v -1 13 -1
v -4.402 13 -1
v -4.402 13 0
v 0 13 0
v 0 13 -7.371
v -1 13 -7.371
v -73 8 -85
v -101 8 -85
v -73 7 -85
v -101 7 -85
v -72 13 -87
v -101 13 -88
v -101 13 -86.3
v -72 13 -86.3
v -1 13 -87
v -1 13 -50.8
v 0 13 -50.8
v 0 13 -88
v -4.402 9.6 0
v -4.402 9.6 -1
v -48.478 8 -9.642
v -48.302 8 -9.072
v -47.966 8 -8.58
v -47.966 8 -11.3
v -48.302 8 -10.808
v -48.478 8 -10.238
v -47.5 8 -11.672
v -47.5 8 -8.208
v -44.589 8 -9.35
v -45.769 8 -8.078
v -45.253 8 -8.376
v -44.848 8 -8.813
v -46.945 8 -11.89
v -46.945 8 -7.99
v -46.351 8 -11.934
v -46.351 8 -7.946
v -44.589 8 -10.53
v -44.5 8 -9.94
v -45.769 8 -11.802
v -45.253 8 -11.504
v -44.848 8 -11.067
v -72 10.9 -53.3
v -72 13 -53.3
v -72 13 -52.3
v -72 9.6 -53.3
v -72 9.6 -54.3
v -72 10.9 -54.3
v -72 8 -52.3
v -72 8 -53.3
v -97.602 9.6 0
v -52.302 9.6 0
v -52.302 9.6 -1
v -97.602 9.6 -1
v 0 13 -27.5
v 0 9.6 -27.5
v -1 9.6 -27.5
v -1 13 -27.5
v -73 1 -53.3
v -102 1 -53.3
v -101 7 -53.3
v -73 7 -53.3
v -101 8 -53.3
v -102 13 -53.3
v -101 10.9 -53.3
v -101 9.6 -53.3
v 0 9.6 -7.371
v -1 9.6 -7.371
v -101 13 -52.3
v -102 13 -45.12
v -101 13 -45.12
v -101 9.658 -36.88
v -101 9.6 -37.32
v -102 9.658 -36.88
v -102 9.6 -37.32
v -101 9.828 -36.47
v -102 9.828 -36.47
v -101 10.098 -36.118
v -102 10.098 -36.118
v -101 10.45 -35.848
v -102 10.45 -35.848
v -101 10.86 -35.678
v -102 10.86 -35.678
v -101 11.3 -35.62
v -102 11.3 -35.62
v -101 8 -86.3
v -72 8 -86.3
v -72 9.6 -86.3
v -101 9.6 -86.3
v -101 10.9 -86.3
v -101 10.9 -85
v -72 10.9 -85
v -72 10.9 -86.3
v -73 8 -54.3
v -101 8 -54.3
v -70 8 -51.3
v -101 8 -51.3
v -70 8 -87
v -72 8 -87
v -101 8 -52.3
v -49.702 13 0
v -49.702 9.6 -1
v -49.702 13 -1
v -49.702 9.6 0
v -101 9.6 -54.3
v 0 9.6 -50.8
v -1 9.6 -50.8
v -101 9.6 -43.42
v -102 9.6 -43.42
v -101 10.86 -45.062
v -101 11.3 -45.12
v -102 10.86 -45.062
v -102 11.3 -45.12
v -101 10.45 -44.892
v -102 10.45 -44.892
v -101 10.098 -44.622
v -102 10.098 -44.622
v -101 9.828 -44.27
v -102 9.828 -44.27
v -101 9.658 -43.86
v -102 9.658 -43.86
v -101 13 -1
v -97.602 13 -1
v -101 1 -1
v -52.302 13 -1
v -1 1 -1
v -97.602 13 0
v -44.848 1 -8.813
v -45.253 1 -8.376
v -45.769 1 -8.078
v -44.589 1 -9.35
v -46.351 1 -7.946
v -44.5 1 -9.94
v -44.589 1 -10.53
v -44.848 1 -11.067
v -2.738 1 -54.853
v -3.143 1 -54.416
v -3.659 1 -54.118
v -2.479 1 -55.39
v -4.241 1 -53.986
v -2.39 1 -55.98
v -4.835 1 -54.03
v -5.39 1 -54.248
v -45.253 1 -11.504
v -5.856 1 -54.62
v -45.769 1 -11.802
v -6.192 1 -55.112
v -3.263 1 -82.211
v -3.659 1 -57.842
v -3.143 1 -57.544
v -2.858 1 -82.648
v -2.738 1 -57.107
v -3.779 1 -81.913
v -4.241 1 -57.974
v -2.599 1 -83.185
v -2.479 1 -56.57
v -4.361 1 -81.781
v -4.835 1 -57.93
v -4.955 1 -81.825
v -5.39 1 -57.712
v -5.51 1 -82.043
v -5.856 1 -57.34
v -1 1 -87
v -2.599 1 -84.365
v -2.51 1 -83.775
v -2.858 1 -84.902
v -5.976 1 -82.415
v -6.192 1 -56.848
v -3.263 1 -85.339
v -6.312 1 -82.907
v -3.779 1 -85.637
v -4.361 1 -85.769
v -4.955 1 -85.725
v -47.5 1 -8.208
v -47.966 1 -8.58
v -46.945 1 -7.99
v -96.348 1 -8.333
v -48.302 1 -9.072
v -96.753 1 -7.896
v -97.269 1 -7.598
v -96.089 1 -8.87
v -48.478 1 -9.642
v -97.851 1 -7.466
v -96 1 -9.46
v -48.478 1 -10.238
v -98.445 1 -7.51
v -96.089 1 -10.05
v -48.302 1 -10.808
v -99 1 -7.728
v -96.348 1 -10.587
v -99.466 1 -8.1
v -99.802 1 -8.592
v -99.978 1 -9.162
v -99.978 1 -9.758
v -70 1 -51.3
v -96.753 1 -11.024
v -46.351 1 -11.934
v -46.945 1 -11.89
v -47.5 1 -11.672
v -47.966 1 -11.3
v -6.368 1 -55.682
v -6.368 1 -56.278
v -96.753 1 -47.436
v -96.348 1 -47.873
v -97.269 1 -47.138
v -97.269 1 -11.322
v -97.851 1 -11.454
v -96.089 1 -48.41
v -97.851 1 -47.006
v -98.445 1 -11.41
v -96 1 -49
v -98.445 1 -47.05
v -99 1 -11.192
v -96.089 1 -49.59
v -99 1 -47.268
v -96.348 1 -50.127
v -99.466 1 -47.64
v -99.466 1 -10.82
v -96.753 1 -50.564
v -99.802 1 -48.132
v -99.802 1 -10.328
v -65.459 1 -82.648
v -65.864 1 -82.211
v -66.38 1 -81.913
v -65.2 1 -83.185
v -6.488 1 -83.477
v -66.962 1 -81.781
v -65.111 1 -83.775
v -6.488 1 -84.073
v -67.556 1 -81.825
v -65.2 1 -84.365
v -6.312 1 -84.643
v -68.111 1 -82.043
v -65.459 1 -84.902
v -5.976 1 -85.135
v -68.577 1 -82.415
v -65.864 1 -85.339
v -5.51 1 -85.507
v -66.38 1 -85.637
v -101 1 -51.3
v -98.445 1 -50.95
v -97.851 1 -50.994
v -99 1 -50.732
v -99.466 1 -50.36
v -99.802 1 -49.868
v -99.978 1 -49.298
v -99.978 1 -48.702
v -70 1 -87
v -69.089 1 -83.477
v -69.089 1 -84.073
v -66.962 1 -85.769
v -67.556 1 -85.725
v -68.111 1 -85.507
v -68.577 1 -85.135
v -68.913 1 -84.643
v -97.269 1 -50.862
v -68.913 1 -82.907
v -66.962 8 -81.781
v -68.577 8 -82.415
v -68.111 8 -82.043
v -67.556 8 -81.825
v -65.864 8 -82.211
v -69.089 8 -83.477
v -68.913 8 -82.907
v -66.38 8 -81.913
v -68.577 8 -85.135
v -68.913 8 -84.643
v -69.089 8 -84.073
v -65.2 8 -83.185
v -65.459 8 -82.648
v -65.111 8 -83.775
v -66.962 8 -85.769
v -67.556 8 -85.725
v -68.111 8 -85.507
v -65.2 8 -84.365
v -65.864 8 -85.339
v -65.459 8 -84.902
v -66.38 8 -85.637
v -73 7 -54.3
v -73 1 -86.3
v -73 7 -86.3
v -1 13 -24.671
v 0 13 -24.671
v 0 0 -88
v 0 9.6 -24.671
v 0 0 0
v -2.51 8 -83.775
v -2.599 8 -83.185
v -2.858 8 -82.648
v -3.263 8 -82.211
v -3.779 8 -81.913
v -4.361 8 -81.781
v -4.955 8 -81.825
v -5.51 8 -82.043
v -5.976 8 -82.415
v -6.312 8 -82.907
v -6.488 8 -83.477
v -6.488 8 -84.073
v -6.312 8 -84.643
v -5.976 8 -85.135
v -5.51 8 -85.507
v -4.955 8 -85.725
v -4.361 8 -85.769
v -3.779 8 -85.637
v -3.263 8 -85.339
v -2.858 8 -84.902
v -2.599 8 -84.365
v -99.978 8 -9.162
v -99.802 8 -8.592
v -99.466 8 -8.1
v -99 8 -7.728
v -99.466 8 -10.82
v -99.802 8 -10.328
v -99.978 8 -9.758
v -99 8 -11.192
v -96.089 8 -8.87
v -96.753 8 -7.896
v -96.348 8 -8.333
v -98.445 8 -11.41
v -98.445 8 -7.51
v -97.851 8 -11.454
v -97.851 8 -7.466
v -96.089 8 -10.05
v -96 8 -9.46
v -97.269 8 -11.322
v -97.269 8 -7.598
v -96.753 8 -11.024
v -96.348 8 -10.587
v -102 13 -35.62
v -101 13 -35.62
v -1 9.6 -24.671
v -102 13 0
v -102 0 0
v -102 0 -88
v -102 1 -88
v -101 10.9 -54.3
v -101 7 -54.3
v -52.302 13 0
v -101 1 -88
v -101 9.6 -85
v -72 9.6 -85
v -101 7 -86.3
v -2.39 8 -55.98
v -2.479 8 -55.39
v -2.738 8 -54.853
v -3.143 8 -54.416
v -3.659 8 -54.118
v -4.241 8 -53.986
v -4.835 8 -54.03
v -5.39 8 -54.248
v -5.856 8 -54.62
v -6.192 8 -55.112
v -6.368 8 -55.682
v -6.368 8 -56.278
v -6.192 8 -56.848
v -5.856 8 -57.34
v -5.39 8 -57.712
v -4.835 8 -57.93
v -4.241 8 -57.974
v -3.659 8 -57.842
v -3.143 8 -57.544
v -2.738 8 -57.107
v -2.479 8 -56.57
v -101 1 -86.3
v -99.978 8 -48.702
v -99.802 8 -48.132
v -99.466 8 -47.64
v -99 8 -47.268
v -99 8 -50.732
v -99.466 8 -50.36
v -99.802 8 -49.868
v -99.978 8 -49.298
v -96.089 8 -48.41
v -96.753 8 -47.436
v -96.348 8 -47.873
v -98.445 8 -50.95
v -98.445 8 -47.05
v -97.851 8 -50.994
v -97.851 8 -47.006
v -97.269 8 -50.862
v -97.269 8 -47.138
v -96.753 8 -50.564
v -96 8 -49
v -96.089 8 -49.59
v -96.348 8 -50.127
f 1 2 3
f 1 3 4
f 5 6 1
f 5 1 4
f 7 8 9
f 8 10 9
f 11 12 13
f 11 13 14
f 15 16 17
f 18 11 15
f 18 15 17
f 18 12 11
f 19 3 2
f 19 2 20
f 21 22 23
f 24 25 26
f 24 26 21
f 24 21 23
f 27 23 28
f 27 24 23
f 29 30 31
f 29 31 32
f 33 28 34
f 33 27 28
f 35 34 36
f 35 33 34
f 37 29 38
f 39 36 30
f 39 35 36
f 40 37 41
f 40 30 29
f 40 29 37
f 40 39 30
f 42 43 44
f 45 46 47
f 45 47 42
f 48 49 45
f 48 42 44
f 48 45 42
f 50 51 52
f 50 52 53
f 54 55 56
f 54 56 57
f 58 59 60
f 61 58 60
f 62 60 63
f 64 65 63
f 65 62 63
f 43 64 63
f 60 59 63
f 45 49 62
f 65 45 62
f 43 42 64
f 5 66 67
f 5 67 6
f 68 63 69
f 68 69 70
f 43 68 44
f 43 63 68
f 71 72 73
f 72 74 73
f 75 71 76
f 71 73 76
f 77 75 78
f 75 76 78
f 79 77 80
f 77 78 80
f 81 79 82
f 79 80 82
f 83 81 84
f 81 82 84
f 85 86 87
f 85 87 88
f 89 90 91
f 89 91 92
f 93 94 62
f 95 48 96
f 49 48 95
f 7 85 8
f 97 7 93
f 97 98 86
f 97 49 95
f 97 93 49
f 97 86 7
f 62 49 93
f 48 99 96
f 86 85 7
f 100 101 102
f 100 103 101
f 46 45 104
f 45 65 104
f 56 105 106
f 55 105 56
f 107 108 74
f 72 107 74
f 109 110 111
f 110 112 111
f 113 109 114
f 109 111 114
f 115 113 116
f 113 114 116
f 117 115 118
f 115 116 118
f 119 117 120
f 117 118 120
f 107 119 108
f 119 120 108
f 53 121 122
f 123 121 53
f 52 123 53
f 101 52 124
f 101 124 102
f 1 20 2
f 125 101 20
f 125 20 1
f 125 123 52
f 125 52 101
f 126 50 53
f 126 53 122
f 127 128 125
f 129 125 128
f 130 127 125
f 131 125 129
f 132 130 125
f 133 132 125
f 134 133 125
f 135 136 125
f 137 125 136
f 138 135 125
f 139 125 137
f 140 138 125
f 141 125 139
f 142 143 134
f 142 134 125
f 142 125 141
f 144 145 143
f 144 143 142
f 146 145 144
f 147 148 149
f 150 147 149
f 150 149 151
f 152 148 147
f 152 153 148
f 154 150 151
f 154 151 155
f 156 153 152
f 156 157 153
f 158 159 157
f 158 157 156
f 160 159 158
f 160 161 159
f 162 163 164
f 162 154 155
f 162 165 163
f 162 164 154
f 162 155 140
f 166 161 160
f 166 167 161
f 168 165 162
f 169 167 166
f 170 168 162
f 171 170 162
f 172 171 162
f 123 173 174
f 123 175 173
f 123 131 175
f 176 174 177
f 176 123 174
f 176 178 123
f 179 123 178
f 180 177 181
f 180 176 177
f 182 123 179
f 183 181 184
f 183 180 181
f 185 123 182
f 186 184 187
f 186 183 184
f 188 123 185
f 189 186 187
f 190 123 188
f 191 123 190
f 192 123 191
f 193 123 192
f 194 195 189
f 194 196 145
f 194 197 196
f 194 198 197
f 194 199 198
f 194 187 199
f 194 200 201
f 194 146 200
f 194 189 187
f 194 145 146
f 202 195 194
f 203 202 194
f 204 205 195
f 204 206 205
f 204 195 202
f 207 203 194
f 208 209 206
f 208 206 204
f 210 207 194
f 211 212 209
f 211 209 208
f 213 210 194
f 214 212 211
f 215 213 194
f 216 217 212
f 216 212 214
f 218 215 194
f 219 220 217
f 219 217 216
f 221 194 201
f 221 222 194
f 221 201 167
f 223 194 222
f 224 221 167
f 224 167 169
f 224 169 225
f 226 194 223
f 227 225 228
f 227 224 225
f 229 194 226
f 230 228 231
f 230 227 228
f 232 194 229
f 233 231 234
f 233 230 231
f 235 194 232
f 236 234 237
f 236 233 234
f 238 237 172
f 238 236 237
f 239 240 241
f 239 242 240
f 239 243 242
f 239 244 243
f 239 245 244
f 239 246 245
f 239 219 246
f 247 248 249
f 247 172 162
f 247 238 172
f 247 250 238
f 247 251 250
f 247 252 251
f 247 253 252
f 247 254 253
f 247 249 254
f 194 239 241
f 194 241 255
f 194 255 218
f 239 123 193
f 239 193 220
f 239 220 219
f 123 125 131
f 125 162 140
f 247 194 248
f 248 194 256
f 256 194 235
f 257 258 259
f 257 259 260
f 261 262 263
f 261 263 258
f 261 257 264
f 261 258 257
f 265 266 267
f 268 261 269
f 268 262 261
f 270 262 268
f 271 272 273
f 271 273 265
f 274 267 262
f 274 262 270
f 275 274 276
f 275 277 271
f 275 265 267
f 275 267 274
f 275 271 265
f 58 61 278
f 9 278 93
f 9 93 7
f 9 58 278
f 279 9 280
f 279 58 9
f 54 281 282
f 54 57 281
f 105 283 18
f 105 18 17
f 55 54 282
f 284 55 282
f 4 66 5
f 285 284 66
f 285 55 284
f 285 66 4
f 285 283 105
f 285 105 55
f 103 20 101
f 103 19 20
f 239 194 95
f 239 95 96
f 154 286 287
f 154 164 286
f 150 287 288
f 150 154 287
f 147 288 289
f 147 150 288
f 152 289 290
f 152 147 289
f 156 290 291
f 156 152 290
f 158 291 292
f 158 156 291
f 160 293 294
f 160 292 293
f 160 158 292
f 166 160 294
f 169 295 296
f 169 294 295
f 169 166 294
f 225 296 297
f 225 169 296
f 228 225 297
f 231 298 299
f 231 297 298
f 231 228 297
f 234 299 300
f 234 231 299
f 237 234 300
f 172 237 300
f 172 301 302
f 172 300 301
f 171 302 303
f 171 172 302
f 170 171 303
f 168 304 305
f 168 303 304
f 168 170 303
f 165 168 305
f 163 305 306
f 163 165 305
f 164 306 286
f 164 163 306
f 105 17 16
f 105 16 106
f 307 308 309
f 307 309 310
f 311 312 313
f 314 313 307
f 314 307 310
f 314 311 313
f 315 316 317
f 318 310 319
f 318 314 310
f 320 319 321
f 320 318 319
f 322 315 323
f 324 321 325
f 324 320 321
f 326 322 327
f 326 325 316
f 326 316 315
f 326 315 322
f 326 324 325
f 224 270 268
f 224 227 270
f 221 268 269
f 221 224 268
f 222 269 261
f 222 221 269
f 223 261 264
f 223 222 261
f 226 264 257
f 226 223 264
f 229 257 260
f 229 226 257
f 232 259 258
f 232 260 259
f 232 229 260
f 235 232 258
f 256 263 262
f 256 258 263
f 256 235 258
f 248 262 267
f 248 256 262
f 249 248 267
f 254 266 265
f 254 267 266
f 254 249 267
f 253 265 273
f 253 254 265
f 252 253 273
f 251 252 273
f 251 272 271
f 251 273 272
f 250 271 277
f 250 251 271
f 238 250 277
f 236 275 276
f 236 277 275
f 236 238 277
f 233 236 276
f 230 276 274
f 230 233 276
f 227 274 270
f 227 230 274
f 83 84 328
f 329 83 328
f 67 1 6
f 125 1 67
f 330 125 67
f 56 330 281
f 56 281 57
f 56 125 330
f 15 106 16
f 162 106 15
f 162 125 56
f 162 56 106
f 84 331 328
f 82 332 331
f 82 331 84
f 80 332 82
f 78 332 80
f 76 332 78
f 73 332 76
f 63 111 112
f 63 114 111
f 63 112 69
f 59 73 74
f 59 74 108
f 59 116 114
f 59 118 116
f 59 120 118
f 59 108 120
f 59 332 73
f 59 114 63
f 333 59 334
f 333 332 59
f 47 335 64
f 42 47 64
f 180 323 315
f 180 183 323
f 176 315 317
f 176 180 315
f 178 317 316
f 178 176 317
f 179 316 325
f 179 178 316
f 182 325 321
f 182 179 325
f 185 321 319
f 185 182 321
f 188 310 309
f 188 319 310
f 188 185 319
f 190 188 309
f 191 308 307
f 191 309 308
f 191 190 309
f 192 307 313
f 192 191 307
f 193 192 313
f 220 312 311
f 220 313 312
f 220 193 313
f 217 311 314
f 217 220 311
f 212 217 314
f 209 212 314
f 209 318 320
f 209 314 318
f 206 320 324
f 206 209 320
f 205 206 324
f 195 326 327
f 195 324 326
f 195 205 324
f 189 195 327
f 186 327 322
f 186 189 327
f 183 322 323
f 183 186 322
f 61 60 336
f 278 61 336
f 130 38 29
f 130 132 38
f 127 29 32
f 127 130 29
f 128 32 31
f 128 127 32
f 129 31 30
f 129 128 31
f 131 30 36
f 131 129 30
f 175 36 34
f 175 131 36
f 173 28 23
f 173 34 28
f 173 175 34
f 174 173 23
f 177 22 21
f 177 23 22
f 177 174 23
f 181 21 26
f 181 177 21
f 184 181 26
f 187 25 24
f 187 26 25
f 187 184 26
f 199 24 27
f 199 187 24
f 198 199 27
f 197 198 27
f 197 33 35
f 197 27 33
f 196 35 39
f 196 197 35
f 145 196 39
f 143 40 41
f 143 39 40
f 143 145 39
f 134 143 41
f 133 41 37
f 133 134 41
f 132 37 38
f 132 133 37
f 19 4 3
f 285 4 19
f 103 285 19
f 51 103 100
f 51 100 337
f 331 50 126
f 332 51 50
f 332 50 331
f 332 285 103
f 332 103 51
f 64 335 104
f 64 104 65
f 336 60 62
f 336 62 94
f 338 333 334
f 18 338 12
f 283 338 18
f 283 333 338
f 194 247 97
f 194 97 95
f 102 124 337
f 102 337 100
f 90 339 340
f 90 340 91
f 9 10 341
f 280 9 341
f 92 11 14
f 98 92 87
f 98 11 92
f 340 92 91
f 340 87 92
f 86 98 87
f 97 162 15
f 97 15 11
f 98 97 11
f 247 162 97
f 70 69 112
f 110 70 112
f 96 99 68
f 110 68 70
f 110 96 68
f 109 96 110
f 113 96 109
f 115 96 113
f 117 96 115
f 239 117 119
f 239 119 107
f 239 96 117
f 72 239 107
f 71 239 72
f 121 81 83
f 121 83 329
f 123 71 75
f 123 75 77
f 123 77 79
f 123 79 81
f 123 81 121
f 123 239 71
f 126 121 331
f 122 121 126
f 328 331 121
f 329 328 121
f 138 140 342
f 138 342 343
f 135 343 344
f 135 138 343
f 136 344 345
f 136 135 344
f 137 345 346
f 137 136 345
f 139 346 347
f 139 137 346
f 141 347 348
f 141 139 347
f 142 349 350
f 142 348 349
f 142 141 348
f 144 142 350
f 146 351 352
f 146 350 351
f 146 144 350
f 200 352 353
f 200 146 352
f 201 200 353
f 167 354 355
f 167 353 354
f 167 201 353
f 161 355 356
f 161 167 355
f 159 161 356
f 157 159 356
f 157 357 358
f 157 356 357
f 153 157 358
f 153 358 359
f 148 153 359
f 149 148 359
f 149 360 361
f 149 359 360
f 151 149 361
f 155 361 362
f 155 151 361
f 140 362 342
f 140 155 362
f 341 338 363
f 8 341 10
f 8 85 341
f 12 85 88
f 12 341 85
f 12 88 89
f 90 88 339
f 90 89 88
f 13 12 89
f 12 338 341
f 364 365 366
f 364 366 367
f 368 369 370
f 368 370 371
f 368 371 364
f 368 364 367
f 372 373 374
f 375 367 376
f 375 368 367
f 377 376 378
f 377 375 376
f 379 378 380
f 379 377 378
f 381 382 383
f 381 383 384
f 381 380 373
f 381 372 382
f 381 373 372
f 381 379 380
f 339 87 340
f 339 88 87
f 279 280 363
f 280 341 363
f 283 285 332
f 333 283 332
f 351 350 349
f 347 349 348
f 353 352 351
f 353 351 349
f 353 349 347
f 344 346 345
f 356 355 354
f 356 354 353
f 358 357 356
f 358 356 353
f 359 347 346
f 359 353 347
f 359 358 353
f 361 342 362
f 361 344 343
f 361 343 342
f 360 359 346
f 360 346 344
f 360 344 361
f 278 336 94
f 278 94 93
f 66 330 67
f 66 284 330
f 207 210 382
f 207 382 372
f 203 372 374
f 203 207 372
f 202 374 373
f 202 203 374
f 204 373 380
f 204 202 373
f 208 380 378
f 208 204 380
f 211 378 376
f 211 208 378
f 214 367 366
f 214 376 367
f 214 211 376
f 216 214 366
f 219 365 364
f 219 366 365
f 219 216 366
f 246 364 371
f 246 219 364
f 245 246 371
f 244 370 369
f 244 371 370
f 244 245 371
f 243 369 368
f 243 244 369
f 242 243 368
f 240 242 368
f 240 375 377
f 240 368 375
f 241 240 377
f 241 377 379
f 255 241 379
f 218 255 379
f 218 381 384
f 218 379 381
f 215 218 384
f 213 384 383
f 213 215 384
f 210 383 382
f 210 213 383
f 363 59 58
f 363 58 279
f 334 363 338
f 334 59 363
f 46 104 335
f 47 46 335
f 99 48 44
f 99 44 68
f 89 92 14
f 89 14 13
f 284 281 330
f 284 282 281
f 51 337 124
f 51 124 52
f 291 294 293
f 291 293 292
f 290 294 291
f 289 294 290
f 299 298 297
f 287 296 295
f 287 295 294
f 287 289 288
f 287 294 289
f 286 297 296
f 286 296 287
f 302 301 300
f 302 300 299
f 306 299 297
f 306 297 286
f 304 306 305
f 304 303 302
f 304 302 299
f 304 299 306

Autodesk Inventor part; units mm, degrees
ref_plane "YZ Plane" through (0, 0, 0) normal (1, 0, 0) x (0, 1, 0)
ref_plane "XZ Plane" through (0, 0, 0) normal (0, 1, 0) x (-1, 0, 0)
ref_plane "XY Plane" through (0, 0, 0) normal (0, 0, 1) x (1, 0, 0)
sketch "Sketch1" plane through (0, 0, 0) normal (0, 1, 0) x (-1, 0, 0)
  line L0 (0, 0) -> (102, 0)
  line L1 (102, 0) -> (102, -88)
  line L2 (102, -88) -> (0, -88)
  line L3 (0, -88) -> (0, 0)
  dimension "d0" = 102
  dimension "d1" = 88
extrude "Extrusion1" add sketch "Sketch1" along normal blind 1
sketch "Sketch3" plane through (0, 1, 0) normal (0, 1, 0) x (1, 0, 0)
  line L0 (0, 88) -> (-102, 88) projected
  line L1 (-102, 0) -> (0, 0) projected
  line L2 (-102, 88) -> (0, 88)
  line L3 (0, 88) -> (0, 0)
  line L4 (0, 0) -> (-102, 0)
  line L5 (-102, 0) -> (-102, 88)
  line L6 (-1, 1) -> (-1, 87)
  line L7 (-1, 87) -> (-101, 87)
  line L8 (-101, 87) -> (-101, 1)
  line L9 (-101, 1) -> (-1, 1)
  dimension "d7" = 1
extrude "Extrusion3" add sketch "Sketch3" along normal blind 12
sketch "Sketch4" plane through (-102, 0, 0) normal (0, 0, 1) x (1, 0, 0)
  line L0 (101, 13) -> (1, 13) projected
  line L1 (4.398, 13) -> (49.698, 13)
  line L2 (49.698, 13) -> (49.698, 9.6)
  line L3 (49.698, 9.6) -> (4.398, 9.6)
  line L4 (4.398, 9.6) -> (4.398, 13)
  line L5 (52.298, 13) -> (97.598, 13)
  line L6 (97.598, 13) -> (97.598, 9.6)
  line L7 (97.598, 9.6) -> (52.298, 9.6)
  line L8 (52.298, 9.6) -> (52.298, 13)
  line L9 (102, 0) -> (102, 13) projected
  line L10 (0, 0) -> (102, 0) projected
  dimension "d10" = 45.3
  dimension "d11" = 4.402
  dimension "d12" = 2.6
  dimension "d13" = 9.6
extrude "Extrusion4" cut sketch "Sketch4" against normal up to surface (1 mm away)
sketch "Sketch5" plane through (0, 0, 0) normal (1, 0, 0) x (0, 0, -1)
  line L0 (7.371, 13) -> (24.671, 13)
  line L1 (24.671, 13) -> (24.671, 9.6)
  line L2 (24.671, 9.6) -> (7.371, 9.6)
  line L3 (7.371, 9.6) -> (7.371, 13)
  line L4 (27.5, 13) -> (50.8, 13)
  line L5 (50.8, 13) -> (50.8, 9.6)
  line L6 (50.8, 9.6) -> (27.5, 9.6)
  line L7 (27.5, 9.6) -> (27.5, 13)
  line L8 (0, 13) -> (88, 13) projected
  line L9 (0, 0) -> (88, 0) projected
  line L10 (0, 13) -> (0, 9.6) projected
  dimension "d16" = 17.3
  dimension "d17" = 23.3
  dimension "d19" = 7.371
  dimension "d20" = 2.829
extrude "Extrusion5" cut sketch "Sketch5" against normal up to surface (1 mm away)
sketch "Sketch6" plane through (-102, 0, -88) normal (-1, 0, 0) x (0, 0, 1)
  line L0 (44.58, 11.3) -> (50.68, 11.3) construction
  line L1 (44.58, 9.6) -> (50.68, 9.6)
  arc A0 (42.88, 11.3) -> (44.58, 9.6) centre (44.58, 11.3) ccw
  arc A1 (50.68, 9.6) -> (52.38, 11.3) centre (50.68, 11.3) ccw
  line L2 (87, 1) -> (87, 13) projected
  line L3 (0, 0) -> (88, 0) projected
  line L4 (0, 13) -> (88, 13) projected
  line L5 (87, 13) -> (1, 13) projected
  line L6 (42.88, 13) -> (42.88, 11.3)
  line L7 (52.38, 11.3) -> (52.38, 13)
  line L8 (60.5, 9.6) -> (37.2, 9.6) projected
  line L9 (42.88, 13) -> (52.38, 13)
  point P0 (47.63, 11.3)
  dimension "d24" = 39.37
  dimension "d25" = 9.5
  dimension "d50" = 1.7
  dimension "d51" = 1.7
  dimension "d52" = 1.7
  dimension "d53" = 1.7
extrude "Extrusion6" cut sketch "Sketch6" against normal up to surface (1 mm away)
sketch "Sketch7" plane through (-102, 0, -88) normal (-1, 0, 0) x (0, 0, 1)
  line L0 (1, 1) -> (87, 1) projected
  line L1 (0, 13) -> (34.7, 13)
  line L2 (34.7, 13) -> (34.7, 1)
  line L3 (34.7, 1) -> (0, 1)
  line L4 (0, 1) -> (0, 13)
  line L5 (0, 13) -> (88, 13) projected
  line L6 (0, 0) -> (0, 13) projected
  point P0 (88, 0)
  dimension "d30" = 34.7
extrude "Extrusion7" cut sketch "Sketch7" against normal up to surface (1 mm away)
sketch "Sketch8" plane through (0, 1, 0) normal (0, 1, 0) x (1, 0, 0)
  line L0 (-101, 54.3) -> (-73, 54.3)
  line L1 (-70, 53.4922) -> (-70, 51.3)
  line L2 (-70, 51.3) -> (-101, 51.3)
  line L3 (-101, 51.3) -> (-101, 54.3)
  line L4 (-1, 87) -> (-101, 87) projected
  line L5 (-73, 54.3) -> (-73, 85)
  line L6 (-73, 87) -> (-70, 87)
  line L7 (-70, 87) -> (-70, 53.4922)
  line L8 (-101, 53.3) -> (-101, 1) projected
  line L9 (-102, 53.3) -> (-101, 53.3) projected
  line L10 (-73, 87) -> (-101, 87)
  line L11 (-101, 87) -> (-101, 85)
  line L12 (-101, 85) -> (-73, 85)
  point P0 (0, 0)
  dimension "d33" = 3
  dimension "d34" = 3
  dimension "d38" = 31
  dimension "d39" = 2
  dimension "d40" = 2
extrude "Extrusion8" add sketch "Sketch8" along normal blind 7
sketch "Sketch9" plane through (0, 8, 0) normal (0, 1, 0) x (1, 0, 0)
  line L0 (-101, 53.3) -> (-72, 53.3)
  line L1 (-72, 53.3) -> (-72, 52.3)
  line L2 (-72, 52.3) -> (-101, 52.3)
  line L3 (-101, 52.3) -> (-101, 53.3)
  line L4 (-73, 54.3) -> (-101, 54.3) projected
  line L5 (-101, 51.3) -> (-70, 51.3) projected
  line L6 (-101, 85) -> (-101, 88) projected
  line L7 (-101, 87) -> (-72, 87)
  line L8 (-72, 87) -> (-72, 86.3)
  line L9 (-72, 86.3) -> (-101, 86.3)
  line L10 (-101, 86.3) -> (-101, 87)
  line L11 (-101, 87) -> (-70, 87) projected
  line L12 (-73, 85) -> (-73, 54.3) projected
  point P0 (0, 0)
  point P1 (-101, 86.3)
  dimension "d41" = 1
  dimension "d42" = 1
  dimension "d45" = 0.7
  dimension "d46" = 1
extrude "Extrusion9" add sketch "Sketch9" along normal up to surface (5 mm away)
sketch "Sketch10" plane through (-101, 1, -54.3) normal (-1, 0, 0) x (0, 0, 1)
  line L0 (1, 0) -> (1, 7) projected
  line L1 (53.3, 0) -> (-32.7, 0) projected
  line L2 (1, 6) -> (-32, 6)
  line L3 (-32, 6) -> (-32, 0)
  line L4 (-32, 0) -> (1, 0)
  line L5 (1, 0) -> (1, 6)
  line L6 (-32, 7) -> (-32, 12) projected
  line L7 (-30.7, 7) -> (0, 7) projected
  point P0 (54.3, -1)
  point P1 (1, 10)
  dimension "d47" = 1
extrude "Extrusion10" cut sketch "Sketch10" against normal up to surface (28 mm away)
sketch "Sketch11" plane through (-101, 8, -54.3) normal (-1, 0, 0) x (0, 0, 1)
  line L0 (1, 5) -> (1, -7) projected
  line L1 (1, 1.6) -> (0, 1.6)
  line L2 (0, 1.6) -> (0, 2.9)
  line L3 (0, 2.9) -> (1, 2.9)
  line L4 (1, 2.9) -> (1, 1.6)
  line L5 (-32, 0) -> (-32, 5) projected
  line L6 (-32, 1.6) -> (-30.7, 1.6)
  line L7 (-30.7, 1.6) -> (-30.7, 2.9)
  line L8 (-30.7, 2.9) -> (-32, 2.9)
  line L9 (-32, 2.9) -> (-32, 1.6)
  line L10 (-32, 0) -> (-30.7, 0) projected
  line L11 (-30.7, -1) -> (-30.7, 0) projected
  line L12 (0, -1) -> (0, 0) projected
  point P0 (54.3, -8)
  point P1 (1, 2.9)
  point P2 (-32, 2.9)
  dimension "d54" = 1.6
extrude "Extrusion11" add sketch "Sketch11" against normal up to surface (29 mm away)
sketch "Sketch12" plane through (0, 1, 0) normal (0, 1, 0) x (1, 0, 0)
  circle A0 centre (-98, 9.46) radius 2
  circle A1 centre (-98, 49) radius 2
  circle A2 centre (-46.5, 9.94) radius 2
  circle A3 centre (-67.111, 83.775) radius 2
  circle A4 centre (-4.51, 83.775) radius 2
  circle A5 centre (-4.39, 55.98) radius 2
  line L0 (-49.702, 1) -> (-4.402, 1) projected
  line L1 (-1, 7.371) -> (-1, 1) projected
  line L2 (-1, 1) -> (-4.402, 1) projected
  line L3 (-1, 87) -> (-1, 50.8) projected
  point P0 (0, 0)
  dimension "d57" = 8.94
  dimension "d58" = 45.5
  dimension "d59" = 4
  dimension "d60" = 54.98
  dimension "d61" = 3.39
  dimension "d62" = 3.51
  dimension "d63" = 82.775
  dimension "d64" = 82.775
  dimension "d65" = 66.111
  dimension "d66" = 97
  dimension "d67" = 8.46
  dimension "d68" = 48
  dimension "d69" = 97
extrude "Extrusion12" add sketch "Sketch12" along normal up to surface (7 mm away)
properties part number "BaseCase"
